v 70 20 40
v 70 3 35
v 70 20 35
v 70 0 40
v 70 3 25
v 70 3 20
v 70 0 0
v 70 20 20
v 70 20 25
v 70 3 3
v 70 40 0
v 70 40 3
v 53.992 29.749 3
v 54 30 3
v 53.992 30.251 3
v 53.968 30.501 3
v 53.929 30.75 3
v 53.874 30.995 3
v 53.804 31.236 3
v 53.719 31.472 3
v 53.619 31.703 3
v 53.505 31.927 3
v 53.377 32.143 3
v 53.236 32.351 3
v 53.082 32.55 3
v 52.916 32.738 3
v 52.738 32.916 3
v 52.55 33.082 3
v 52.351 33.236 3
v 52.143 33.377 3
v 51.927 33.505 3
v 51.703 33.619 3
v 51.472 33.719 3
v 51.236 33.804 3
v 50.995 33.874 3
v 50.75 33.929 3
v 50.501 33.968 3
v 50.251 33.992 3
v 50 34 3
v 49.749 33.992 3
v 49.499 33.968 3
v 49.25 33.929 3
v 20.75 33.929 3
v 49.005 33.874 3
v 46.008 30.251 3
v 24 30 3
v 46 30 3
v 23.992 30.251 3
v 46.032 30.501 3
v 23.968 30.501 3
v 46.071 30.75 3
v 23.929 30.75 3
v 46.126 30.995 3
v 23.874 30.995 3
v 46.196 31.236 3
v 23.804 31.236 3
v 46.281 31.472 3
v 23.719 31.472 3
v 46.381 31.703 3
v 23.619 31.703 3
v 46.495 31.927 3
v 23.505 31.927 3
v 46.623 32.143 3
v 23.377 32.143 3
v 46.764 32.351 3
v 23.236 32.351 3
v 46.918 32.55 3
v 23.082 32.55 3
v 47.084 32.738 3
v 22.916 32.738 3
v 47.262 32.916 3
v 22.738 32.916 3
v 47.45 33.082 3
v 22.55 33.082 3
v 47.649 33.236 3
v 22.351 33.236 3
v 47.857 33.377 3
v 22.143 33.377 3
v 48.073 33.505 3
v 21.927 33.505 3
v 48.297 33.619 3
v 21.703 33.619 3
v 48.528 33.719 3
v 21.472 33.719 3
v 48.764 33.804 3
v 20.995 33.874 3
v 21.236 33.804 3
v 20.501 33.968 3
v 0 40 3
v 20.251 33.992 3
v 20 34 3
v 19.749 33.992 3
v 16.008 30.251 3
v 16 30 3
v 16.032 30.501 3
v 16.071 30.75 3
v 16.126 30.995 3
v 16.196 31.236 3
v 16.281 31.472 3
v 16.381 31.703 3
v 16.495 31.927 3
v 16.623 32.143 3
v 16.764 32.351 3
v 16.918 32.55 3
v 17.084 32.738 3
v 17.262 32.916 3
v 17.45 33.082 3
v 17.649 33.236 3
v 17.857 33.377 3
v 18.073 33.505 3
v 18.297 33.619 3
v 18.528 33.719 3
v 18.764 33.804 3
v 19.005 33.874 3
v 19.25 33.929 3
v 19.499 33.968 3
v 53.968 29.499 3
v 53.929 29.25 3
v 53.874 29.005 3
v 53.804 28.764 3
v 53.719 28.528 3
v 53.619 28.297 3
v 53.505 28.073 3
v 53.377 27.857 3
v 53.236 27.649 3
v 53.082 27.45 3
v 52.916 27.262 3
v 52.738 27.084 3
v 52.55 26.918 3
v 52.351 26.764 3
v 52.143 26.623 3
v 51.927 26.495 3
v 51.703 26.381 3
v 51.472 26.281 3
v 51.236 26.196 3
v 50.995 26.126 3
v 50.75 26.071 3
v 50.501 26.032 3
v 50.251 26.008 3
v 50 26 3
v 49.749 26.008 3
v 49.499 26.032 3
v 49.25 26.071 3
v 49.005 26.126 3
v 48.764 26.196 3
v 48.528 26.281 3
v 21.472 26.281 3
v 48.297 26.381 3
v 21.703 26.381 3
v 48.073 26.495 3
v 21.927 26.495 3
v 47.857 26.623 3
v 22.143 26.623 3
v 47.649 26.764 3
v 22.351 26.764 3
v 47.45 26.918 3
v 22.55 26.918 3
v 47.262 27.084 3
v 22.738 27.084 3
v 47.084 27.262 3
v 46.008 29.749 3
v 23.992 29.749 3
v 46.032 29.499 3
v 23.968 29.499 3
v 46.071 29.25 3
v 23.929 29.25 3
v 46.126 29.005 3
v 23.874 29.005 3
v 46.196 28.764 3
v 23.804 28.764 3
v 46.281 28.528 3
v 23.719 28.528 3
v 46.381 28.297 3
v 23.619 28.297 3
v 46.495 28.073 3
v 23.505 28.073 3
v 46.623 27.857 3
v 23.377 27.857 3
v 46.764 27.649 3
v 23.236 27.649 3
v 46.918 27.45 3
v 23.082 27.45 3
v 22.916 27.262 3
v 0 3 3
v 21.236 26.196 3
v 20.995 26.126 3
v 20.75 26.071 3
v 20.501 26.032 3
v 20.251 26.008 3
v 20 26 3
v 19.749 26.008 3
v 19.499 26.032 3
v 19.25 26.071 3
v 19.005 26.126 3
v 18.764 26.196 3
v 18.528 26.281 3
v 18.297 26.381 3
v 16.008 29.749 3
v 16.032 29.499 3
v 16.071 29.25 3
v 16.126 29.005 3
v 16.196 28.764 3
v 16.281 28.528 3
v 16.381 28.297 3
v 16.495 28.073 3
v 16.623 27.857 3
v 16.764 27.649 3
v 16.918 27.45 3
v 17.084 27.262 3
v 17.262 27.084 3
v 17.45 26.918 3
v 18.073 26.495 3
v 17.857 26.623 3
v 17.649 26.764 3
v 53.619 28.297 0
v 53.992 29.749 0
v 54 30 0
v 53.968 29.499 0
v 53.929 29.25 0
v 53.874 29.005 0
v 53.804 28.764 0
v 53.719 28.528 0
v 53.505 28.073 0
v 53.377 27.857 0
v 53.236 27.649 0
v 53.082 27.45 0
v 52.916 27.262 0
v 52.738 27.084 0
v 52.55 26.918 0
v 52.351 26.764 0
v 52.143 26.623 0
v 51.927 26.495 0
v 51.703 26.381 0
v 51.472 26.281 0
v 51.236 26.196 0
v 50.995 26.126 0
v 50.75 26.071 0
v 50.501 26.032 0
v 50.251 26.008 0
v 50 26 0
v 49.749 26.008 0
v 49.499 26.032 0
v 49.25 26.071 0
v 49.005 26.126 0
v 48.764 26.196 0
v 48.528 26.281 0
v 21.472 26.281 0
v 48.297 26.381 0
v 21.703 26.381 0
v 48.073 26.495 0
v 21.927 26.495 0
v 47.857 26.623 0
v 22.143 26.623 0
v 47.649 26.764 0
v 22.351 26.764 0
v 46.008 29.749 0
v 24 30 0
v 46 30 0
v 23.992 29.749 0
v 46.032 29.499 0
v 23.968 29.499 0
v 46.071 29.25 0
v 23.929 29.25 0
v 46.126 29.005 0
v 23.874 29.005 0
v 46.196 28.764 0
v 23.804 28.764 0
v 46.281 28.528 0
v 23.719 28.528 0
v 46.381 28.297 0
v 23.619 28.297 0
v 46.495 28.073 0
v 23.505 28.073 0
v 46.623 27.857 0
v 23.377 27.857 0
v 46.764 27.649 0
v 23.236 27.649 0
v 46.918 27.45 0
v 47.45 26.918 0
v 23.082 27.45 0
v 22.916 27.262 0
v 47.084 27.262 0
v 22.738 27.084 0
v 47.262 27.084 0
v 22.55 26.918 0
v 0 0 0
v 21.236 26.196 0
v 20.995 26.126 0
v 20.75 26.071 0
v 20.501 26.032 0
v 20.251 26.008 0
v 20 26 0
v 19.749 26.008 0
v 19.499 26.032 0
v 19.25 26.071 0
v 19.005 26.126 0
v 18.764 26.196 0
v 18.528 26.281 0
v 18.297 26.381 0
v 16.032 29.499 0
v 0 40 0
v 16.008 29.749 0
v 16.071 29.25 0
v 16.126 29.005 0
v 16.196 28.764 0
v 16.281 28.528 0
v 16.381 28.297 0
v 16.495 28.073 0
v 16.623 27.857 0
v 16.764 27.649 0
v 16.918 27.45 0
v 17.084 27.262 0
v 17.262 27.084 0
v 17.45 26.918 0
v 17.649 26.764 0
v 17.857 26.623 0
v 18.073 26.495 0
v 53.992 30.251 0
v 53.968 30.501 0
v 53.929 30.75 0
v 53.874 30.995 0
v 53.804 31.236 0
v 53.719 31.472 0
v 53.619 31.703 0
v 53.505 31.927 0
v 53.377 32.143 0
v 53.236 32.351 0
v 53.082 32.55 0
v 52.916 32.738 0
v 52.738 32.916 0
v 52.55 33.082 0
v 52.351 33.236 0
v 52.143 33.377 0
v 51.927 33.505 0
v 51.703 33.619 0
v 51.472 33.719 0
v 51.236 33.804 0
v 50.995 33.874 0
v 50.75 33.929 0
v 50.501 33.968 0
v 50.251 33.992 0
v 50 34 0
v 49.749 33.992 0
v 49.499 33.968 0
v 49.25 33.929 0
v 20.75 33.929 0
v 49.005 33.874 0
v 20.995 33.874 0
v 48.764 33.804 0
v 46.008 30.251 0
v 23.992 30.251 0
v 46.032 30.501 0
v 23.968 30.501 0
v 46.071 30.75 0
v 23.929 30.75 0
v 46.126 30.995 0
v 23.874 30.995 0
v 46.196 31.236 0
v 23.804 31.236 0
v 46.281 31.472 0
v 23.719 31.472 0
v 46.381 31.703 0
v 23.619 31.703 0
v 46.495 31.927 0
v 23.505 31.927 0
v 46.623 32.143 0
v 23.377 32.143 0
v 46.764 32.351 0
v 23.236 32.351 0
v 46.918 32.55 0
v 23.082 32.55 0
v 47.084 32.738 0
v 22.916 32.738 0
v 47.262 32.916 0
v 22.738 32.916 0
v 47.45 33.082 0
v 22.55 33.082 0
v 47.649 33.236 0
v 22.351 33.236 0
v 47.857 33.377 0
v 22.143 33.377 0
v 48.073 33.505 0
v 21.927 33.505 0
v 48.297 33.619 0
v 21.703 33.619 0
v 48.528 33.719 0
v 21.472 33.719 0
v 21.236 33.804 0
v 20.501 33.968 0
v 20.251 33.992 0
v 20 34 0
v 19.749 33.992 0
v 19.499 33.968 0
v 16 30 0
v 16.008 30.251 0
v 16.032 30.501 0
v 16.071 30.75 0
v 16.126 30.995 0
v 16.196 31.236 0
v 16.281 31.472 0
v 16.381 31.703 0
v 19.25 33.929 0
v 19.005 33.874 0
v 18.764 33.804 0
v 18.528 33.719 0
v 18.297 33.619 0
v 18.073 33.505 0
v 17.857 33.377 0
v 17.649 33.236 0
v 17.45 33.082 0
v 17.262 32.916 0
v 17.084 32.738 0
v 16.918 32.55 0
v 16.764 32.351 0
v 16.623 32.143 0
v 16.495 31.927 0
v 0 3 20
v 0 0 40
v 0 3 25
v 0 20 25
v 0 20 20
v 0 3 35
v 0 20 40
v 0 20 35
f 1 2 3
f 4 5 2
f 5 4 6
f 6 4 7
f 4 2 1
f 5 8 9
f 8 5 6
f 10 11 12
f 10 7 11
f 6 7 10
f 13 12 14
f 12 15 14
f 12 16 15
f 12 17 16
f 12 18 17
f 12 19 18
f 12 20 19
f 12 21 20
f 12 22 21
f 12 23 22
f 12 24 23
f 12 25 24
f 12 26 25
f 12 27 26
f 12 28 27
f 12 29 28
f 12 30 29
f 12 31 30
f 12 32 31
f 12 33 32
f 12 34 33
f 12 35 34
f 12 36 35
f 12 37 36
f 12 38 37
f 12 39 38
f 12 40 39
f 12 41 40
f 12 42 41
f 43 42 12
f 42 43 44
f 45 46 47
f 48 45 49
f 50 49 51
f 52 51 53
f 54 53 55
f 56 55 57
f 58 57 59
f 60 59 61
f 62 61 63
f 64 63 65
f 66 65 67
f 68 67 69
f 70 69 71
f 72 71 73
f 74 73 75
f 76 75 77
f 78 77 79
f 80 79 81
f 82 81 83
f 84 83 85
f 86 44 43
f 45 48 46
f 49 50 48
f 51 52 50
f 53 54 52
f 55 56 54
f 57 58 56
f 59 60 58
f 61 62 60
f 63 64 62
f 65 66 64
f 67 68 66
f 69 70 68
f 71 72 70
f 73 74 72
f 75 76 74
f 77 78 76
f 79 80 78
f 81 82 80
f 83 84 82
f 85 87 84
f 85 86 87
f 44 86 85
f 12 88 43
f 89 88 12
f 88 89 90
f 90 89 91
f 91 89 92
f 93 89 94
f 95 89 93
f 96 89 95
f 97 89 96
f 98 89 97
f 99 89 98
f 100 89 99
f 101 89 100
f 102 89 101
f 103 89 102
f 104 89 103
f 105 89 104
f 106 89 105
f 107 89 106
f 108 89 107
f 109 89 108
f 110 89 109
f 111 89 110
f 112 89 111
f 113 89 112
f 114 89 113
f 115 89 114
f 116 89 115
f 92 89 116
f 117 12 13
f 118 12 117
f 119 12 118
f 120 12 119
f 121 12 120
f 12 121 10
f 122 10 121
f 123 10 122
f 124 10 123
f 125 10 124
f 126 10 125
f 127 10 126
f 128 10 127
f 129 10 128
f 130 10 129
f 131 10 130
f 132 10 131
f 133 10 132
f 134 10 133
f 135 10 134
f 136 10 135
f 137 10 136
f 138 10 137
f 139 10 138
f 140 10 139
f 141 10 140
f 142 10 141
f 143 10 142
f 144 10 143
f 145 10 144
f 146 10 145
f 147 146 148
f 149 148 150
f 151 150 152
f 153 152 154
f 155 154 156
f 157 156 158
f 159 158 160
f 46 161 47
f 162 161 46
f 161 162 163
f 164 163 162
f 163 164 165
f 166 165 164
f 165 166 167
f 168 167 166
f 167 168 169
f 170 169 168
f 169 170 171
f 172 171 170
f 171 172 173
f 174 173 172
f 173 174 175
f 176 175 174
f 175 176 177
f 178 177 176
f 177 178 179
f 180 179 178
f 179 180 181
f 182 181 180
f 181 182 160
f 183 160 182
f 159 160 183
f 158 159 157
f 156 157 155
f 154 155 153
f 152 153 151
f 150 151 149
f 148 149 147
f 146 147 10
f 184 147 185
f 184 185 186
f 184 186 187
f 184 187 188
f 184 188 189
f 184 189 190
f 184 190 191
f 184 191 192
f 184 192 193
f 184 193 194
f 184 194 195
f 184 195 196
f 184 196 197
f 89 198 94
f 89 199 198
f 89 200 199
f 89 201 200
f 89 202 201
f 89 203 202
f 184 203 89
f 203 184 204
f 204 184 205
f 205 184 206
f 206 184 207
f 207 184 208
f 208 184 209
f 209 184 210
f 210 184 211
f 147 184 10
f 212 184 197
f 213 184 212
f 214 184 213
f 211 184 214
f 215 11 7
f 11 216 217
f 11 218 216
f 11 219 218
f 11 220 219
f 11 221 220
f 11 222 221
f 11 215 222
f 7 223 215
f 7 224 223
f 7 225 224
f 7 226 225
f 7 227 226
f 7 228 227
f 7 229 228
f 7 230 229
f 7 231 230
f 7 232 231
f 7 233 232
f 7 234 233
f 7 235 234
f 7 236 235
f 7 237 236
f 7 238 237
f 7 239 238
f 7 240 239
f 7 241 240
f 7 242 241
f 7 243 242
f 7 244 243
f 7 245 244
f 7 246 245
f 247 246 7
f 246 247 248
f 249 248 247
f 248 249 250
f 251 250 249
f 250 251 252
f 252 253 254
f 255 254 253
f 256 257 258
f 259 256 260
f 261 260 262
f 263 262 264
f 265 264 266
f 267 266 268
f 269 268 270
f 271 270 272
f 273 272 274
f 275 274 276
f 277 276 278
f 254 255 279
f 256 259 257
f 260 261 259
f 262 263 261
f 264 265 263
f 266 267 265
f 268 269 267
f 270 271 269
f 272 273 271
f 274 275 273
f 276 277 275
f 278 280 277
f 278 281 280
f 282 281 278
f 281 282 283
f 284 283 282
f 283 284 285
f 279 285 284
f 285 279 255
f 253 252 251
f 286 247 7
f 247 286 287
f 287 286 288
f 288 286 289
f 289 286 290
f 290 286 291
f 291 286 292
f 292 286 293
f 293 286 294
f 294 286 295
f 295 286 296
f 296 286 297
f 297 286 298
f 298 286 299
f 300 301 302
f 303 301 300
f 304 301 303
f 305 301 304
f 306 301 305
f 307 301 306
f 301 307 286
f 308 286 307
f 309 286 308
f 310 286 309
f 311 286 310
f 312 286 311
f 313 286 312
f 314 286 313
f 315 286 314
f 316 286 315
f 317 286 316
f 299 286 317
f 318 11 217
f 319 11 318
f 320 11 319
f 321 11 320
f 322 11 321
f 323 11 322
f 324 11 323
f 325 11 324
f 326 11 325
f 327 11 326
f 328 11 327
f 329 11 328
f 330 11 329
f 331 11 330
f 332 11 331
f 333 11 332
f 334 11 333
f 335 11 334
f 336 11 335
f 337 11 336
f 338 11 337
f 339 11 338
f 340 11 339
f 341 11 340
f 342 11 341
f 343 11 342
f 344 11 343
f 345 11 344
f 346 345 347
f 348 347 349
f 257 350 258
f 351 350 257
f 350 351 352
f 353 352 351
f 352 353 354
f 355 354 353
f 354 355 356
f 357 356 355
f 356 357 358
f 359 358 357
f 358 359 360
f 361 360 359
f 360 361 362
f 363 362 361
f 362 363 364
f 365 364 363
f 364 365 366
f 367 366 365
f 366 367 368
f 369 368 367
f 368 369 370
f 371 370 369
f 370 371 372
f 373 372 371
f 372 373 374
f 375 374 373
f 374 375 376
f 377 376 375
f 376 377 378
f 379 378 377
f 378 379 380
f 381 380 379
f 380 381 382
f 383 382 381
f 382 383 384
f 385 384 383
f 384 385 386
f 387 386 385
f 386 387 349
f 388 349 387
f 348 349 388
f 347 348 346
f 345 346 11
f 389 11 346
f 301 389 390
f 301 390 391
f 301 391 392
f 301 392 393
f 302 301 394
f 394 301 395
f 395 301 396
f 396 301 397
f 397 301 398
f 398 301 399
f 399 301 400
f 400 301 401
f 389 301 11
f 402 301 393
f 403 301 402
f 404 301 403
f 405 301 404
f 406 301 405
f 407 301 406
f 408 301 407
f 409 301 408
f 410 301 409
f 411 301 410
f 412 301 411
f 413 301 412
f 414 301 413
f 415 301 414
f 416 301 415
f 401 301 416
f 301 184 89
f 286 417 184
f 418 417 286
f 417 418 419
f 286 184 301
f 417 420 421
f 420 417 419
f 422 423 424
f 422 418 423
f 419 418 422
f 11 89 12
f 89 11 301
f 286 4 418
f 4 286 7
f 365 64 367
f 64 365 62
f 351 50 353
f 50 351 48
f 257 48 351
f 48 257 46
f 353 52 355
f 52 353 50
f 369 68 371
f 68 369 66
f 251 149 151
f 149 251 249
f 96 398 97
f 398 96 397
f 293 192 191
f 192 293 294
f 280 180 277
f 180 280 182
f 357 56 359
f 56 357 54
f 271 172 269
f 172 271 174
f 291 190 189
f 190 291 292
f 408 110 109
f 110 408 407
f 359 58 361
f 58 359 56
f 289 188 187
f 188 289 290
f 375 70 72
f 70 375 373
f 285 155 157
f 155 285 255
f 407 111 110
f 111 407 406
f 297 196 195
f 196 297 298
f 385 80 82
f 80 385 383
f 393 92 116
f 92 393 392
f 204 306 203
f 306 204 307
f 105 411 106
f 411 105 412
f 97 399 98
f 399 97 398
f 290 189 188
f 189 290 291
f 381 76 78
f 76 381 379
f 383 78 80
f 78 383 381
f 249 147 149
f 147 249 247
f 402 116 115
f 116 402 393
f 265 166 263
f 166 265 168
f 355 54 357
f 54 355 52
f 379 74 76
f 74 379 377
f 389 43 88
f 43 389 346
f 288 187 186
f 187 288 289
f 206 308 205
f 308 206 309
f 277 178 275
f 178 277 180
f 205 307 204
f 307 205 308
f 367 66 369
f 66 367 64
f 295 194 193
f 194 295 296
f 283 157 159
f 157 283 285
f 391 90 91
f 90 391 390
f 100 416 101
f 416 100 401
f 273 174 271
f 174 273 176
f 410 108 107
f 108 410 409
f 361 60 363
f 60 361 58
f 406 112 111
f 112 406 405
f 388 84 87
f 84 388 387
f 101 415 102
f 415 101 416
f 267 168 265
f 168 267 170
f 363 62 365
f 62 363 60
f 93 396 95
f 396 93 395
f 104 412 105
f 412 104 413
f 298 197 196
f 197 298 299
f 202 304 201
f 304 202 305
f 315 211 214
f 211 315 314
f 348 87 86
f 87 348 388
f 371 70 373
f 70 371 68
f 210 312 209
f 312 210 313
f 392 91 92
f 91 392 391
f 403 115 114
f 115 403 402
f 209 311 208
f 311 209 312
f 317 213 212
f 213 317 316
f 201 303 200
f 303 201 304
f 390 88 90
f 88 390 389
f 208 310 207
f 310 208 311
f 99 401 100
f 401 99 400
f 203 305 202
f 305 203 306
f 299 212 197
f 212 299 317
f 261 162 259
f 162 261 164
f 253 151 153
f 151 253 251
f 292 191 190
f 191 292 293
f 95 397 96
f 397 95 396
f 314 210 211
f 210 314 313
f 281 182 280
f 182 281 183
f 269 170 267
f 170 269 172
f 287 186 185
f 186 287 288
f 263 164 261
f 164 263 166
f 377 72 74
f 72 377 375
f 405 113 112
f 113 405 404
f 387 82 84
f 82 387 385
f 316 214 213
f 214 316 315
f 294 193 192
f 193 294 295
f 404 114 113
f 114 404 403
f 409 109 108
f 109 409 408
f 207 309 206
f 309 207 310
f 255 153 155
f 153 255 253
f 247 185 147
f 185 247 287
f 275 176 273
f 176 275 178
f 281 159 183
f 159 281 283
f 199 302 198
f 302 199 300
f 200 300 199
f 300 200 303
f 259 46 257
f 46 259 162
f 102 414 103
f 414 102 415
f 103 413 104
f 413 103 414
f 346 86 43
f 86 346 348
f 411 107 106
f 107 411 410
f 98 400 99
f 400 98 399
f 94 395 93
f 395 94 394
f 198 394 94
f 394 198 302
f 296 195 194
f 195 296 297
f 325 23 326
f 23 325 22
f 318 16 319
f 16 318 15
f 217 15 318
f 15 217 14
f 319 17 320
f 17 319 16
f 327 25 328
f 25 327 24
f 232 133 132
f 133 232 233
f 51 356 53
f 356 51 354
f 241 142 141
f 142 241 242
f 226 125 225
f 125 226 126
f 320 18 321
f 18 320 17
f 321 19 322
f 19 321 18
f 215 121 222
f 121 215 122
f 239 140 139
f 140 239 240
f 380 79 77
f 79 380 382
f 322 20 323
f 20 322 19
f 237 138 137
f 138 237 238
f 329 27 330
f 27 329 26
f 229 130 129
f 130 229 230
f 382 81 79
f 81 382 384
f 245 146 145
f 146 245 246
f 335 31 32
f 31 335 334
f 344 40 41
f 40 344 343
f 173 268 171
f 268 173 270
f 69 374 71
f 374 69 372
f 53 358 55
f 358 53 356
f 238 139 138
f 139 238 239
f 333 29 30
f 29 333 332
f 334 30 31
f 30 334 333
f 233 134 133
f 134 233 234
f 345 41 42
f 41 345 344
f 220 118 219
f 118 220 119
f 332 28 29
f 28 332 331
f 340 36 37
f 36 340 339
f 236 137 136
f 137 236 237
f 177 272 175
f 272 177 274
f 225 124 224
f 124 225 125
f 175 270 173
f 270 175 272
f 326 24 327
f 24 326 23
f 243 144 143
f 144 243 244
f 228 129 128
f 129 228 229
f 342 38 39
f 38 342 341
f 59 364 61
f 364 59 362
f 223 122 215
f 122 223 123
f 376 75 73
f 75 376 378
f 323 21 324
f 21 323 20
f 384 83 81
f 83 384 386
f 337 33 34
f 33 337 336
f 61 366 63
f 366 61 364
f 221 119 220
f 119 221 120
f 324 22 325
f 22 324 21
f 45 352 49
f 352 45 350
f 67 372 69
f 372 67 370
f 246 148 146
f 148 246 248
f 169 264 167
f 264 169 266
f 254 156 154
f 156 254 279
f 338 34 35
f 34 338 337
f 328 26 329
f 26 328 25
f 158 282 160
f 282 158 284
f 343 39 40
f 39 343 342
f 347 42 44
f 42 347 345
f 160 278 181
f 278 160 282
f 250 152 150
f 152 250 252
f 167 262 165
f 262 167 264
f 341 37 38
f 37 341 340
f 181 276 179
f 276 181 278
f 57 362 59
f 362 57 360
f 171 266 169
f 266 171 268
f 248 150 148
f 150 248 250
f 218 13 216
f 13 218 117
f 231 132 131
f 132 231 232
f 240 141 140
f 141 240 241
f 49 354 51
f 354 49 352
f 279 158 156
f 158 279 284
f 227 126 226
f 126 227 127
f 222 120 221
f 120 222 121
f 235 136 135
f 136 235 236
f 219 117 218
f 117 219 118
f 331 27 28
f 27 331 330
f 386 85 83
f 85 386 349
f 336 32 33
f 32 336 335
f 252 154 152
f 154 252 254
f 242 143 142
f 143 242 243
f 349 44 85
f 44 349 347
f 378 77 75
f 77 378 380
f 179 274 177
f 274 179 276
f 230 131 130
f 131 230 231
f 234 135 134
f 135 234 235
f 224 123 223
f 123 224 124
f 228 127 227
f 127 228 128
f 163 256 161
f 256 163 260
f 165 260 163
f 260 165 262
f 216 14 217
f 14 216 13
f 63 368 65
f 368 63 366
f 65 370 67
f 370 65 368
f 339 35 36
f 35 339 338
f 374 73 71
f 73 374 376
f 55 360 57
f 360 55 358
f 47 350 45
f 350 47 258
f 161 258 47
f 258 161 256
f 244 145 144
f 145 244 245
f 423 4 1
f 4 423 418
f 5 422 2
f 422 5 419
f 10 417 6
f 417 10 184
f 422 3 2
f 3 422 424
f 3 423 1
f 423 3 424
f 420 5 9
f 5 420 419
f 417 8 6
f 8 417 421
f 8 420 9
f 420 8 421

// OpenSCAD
//This is the holder for the PMT

module wall(x,y,z) {
	 color("yellow") cube(size=[x,y,z], center=false);
}

module slab(x,y,z) {
  color("green") cube(size=[x,y,z], center=false);
}

module PMT_slot(x,y,z) {
  color("red") cube(size=[x,y,z], center=false);
}

difference(){
	wall(70,40,3);
	translate([20,30,0]) cylinder(h = 21, r=4, center = true, $fn=100);
	translate([50,30,0]) cylinder(h = 21, r=4, center = true, $fn=100);
}

difference(){
	slab(70, 3, 40);

}

	translate([0, 0, 35]) PMT_slot(70, 20,5);
	translate([0, 0, 20]) PMT_slot(70, 20,5);
